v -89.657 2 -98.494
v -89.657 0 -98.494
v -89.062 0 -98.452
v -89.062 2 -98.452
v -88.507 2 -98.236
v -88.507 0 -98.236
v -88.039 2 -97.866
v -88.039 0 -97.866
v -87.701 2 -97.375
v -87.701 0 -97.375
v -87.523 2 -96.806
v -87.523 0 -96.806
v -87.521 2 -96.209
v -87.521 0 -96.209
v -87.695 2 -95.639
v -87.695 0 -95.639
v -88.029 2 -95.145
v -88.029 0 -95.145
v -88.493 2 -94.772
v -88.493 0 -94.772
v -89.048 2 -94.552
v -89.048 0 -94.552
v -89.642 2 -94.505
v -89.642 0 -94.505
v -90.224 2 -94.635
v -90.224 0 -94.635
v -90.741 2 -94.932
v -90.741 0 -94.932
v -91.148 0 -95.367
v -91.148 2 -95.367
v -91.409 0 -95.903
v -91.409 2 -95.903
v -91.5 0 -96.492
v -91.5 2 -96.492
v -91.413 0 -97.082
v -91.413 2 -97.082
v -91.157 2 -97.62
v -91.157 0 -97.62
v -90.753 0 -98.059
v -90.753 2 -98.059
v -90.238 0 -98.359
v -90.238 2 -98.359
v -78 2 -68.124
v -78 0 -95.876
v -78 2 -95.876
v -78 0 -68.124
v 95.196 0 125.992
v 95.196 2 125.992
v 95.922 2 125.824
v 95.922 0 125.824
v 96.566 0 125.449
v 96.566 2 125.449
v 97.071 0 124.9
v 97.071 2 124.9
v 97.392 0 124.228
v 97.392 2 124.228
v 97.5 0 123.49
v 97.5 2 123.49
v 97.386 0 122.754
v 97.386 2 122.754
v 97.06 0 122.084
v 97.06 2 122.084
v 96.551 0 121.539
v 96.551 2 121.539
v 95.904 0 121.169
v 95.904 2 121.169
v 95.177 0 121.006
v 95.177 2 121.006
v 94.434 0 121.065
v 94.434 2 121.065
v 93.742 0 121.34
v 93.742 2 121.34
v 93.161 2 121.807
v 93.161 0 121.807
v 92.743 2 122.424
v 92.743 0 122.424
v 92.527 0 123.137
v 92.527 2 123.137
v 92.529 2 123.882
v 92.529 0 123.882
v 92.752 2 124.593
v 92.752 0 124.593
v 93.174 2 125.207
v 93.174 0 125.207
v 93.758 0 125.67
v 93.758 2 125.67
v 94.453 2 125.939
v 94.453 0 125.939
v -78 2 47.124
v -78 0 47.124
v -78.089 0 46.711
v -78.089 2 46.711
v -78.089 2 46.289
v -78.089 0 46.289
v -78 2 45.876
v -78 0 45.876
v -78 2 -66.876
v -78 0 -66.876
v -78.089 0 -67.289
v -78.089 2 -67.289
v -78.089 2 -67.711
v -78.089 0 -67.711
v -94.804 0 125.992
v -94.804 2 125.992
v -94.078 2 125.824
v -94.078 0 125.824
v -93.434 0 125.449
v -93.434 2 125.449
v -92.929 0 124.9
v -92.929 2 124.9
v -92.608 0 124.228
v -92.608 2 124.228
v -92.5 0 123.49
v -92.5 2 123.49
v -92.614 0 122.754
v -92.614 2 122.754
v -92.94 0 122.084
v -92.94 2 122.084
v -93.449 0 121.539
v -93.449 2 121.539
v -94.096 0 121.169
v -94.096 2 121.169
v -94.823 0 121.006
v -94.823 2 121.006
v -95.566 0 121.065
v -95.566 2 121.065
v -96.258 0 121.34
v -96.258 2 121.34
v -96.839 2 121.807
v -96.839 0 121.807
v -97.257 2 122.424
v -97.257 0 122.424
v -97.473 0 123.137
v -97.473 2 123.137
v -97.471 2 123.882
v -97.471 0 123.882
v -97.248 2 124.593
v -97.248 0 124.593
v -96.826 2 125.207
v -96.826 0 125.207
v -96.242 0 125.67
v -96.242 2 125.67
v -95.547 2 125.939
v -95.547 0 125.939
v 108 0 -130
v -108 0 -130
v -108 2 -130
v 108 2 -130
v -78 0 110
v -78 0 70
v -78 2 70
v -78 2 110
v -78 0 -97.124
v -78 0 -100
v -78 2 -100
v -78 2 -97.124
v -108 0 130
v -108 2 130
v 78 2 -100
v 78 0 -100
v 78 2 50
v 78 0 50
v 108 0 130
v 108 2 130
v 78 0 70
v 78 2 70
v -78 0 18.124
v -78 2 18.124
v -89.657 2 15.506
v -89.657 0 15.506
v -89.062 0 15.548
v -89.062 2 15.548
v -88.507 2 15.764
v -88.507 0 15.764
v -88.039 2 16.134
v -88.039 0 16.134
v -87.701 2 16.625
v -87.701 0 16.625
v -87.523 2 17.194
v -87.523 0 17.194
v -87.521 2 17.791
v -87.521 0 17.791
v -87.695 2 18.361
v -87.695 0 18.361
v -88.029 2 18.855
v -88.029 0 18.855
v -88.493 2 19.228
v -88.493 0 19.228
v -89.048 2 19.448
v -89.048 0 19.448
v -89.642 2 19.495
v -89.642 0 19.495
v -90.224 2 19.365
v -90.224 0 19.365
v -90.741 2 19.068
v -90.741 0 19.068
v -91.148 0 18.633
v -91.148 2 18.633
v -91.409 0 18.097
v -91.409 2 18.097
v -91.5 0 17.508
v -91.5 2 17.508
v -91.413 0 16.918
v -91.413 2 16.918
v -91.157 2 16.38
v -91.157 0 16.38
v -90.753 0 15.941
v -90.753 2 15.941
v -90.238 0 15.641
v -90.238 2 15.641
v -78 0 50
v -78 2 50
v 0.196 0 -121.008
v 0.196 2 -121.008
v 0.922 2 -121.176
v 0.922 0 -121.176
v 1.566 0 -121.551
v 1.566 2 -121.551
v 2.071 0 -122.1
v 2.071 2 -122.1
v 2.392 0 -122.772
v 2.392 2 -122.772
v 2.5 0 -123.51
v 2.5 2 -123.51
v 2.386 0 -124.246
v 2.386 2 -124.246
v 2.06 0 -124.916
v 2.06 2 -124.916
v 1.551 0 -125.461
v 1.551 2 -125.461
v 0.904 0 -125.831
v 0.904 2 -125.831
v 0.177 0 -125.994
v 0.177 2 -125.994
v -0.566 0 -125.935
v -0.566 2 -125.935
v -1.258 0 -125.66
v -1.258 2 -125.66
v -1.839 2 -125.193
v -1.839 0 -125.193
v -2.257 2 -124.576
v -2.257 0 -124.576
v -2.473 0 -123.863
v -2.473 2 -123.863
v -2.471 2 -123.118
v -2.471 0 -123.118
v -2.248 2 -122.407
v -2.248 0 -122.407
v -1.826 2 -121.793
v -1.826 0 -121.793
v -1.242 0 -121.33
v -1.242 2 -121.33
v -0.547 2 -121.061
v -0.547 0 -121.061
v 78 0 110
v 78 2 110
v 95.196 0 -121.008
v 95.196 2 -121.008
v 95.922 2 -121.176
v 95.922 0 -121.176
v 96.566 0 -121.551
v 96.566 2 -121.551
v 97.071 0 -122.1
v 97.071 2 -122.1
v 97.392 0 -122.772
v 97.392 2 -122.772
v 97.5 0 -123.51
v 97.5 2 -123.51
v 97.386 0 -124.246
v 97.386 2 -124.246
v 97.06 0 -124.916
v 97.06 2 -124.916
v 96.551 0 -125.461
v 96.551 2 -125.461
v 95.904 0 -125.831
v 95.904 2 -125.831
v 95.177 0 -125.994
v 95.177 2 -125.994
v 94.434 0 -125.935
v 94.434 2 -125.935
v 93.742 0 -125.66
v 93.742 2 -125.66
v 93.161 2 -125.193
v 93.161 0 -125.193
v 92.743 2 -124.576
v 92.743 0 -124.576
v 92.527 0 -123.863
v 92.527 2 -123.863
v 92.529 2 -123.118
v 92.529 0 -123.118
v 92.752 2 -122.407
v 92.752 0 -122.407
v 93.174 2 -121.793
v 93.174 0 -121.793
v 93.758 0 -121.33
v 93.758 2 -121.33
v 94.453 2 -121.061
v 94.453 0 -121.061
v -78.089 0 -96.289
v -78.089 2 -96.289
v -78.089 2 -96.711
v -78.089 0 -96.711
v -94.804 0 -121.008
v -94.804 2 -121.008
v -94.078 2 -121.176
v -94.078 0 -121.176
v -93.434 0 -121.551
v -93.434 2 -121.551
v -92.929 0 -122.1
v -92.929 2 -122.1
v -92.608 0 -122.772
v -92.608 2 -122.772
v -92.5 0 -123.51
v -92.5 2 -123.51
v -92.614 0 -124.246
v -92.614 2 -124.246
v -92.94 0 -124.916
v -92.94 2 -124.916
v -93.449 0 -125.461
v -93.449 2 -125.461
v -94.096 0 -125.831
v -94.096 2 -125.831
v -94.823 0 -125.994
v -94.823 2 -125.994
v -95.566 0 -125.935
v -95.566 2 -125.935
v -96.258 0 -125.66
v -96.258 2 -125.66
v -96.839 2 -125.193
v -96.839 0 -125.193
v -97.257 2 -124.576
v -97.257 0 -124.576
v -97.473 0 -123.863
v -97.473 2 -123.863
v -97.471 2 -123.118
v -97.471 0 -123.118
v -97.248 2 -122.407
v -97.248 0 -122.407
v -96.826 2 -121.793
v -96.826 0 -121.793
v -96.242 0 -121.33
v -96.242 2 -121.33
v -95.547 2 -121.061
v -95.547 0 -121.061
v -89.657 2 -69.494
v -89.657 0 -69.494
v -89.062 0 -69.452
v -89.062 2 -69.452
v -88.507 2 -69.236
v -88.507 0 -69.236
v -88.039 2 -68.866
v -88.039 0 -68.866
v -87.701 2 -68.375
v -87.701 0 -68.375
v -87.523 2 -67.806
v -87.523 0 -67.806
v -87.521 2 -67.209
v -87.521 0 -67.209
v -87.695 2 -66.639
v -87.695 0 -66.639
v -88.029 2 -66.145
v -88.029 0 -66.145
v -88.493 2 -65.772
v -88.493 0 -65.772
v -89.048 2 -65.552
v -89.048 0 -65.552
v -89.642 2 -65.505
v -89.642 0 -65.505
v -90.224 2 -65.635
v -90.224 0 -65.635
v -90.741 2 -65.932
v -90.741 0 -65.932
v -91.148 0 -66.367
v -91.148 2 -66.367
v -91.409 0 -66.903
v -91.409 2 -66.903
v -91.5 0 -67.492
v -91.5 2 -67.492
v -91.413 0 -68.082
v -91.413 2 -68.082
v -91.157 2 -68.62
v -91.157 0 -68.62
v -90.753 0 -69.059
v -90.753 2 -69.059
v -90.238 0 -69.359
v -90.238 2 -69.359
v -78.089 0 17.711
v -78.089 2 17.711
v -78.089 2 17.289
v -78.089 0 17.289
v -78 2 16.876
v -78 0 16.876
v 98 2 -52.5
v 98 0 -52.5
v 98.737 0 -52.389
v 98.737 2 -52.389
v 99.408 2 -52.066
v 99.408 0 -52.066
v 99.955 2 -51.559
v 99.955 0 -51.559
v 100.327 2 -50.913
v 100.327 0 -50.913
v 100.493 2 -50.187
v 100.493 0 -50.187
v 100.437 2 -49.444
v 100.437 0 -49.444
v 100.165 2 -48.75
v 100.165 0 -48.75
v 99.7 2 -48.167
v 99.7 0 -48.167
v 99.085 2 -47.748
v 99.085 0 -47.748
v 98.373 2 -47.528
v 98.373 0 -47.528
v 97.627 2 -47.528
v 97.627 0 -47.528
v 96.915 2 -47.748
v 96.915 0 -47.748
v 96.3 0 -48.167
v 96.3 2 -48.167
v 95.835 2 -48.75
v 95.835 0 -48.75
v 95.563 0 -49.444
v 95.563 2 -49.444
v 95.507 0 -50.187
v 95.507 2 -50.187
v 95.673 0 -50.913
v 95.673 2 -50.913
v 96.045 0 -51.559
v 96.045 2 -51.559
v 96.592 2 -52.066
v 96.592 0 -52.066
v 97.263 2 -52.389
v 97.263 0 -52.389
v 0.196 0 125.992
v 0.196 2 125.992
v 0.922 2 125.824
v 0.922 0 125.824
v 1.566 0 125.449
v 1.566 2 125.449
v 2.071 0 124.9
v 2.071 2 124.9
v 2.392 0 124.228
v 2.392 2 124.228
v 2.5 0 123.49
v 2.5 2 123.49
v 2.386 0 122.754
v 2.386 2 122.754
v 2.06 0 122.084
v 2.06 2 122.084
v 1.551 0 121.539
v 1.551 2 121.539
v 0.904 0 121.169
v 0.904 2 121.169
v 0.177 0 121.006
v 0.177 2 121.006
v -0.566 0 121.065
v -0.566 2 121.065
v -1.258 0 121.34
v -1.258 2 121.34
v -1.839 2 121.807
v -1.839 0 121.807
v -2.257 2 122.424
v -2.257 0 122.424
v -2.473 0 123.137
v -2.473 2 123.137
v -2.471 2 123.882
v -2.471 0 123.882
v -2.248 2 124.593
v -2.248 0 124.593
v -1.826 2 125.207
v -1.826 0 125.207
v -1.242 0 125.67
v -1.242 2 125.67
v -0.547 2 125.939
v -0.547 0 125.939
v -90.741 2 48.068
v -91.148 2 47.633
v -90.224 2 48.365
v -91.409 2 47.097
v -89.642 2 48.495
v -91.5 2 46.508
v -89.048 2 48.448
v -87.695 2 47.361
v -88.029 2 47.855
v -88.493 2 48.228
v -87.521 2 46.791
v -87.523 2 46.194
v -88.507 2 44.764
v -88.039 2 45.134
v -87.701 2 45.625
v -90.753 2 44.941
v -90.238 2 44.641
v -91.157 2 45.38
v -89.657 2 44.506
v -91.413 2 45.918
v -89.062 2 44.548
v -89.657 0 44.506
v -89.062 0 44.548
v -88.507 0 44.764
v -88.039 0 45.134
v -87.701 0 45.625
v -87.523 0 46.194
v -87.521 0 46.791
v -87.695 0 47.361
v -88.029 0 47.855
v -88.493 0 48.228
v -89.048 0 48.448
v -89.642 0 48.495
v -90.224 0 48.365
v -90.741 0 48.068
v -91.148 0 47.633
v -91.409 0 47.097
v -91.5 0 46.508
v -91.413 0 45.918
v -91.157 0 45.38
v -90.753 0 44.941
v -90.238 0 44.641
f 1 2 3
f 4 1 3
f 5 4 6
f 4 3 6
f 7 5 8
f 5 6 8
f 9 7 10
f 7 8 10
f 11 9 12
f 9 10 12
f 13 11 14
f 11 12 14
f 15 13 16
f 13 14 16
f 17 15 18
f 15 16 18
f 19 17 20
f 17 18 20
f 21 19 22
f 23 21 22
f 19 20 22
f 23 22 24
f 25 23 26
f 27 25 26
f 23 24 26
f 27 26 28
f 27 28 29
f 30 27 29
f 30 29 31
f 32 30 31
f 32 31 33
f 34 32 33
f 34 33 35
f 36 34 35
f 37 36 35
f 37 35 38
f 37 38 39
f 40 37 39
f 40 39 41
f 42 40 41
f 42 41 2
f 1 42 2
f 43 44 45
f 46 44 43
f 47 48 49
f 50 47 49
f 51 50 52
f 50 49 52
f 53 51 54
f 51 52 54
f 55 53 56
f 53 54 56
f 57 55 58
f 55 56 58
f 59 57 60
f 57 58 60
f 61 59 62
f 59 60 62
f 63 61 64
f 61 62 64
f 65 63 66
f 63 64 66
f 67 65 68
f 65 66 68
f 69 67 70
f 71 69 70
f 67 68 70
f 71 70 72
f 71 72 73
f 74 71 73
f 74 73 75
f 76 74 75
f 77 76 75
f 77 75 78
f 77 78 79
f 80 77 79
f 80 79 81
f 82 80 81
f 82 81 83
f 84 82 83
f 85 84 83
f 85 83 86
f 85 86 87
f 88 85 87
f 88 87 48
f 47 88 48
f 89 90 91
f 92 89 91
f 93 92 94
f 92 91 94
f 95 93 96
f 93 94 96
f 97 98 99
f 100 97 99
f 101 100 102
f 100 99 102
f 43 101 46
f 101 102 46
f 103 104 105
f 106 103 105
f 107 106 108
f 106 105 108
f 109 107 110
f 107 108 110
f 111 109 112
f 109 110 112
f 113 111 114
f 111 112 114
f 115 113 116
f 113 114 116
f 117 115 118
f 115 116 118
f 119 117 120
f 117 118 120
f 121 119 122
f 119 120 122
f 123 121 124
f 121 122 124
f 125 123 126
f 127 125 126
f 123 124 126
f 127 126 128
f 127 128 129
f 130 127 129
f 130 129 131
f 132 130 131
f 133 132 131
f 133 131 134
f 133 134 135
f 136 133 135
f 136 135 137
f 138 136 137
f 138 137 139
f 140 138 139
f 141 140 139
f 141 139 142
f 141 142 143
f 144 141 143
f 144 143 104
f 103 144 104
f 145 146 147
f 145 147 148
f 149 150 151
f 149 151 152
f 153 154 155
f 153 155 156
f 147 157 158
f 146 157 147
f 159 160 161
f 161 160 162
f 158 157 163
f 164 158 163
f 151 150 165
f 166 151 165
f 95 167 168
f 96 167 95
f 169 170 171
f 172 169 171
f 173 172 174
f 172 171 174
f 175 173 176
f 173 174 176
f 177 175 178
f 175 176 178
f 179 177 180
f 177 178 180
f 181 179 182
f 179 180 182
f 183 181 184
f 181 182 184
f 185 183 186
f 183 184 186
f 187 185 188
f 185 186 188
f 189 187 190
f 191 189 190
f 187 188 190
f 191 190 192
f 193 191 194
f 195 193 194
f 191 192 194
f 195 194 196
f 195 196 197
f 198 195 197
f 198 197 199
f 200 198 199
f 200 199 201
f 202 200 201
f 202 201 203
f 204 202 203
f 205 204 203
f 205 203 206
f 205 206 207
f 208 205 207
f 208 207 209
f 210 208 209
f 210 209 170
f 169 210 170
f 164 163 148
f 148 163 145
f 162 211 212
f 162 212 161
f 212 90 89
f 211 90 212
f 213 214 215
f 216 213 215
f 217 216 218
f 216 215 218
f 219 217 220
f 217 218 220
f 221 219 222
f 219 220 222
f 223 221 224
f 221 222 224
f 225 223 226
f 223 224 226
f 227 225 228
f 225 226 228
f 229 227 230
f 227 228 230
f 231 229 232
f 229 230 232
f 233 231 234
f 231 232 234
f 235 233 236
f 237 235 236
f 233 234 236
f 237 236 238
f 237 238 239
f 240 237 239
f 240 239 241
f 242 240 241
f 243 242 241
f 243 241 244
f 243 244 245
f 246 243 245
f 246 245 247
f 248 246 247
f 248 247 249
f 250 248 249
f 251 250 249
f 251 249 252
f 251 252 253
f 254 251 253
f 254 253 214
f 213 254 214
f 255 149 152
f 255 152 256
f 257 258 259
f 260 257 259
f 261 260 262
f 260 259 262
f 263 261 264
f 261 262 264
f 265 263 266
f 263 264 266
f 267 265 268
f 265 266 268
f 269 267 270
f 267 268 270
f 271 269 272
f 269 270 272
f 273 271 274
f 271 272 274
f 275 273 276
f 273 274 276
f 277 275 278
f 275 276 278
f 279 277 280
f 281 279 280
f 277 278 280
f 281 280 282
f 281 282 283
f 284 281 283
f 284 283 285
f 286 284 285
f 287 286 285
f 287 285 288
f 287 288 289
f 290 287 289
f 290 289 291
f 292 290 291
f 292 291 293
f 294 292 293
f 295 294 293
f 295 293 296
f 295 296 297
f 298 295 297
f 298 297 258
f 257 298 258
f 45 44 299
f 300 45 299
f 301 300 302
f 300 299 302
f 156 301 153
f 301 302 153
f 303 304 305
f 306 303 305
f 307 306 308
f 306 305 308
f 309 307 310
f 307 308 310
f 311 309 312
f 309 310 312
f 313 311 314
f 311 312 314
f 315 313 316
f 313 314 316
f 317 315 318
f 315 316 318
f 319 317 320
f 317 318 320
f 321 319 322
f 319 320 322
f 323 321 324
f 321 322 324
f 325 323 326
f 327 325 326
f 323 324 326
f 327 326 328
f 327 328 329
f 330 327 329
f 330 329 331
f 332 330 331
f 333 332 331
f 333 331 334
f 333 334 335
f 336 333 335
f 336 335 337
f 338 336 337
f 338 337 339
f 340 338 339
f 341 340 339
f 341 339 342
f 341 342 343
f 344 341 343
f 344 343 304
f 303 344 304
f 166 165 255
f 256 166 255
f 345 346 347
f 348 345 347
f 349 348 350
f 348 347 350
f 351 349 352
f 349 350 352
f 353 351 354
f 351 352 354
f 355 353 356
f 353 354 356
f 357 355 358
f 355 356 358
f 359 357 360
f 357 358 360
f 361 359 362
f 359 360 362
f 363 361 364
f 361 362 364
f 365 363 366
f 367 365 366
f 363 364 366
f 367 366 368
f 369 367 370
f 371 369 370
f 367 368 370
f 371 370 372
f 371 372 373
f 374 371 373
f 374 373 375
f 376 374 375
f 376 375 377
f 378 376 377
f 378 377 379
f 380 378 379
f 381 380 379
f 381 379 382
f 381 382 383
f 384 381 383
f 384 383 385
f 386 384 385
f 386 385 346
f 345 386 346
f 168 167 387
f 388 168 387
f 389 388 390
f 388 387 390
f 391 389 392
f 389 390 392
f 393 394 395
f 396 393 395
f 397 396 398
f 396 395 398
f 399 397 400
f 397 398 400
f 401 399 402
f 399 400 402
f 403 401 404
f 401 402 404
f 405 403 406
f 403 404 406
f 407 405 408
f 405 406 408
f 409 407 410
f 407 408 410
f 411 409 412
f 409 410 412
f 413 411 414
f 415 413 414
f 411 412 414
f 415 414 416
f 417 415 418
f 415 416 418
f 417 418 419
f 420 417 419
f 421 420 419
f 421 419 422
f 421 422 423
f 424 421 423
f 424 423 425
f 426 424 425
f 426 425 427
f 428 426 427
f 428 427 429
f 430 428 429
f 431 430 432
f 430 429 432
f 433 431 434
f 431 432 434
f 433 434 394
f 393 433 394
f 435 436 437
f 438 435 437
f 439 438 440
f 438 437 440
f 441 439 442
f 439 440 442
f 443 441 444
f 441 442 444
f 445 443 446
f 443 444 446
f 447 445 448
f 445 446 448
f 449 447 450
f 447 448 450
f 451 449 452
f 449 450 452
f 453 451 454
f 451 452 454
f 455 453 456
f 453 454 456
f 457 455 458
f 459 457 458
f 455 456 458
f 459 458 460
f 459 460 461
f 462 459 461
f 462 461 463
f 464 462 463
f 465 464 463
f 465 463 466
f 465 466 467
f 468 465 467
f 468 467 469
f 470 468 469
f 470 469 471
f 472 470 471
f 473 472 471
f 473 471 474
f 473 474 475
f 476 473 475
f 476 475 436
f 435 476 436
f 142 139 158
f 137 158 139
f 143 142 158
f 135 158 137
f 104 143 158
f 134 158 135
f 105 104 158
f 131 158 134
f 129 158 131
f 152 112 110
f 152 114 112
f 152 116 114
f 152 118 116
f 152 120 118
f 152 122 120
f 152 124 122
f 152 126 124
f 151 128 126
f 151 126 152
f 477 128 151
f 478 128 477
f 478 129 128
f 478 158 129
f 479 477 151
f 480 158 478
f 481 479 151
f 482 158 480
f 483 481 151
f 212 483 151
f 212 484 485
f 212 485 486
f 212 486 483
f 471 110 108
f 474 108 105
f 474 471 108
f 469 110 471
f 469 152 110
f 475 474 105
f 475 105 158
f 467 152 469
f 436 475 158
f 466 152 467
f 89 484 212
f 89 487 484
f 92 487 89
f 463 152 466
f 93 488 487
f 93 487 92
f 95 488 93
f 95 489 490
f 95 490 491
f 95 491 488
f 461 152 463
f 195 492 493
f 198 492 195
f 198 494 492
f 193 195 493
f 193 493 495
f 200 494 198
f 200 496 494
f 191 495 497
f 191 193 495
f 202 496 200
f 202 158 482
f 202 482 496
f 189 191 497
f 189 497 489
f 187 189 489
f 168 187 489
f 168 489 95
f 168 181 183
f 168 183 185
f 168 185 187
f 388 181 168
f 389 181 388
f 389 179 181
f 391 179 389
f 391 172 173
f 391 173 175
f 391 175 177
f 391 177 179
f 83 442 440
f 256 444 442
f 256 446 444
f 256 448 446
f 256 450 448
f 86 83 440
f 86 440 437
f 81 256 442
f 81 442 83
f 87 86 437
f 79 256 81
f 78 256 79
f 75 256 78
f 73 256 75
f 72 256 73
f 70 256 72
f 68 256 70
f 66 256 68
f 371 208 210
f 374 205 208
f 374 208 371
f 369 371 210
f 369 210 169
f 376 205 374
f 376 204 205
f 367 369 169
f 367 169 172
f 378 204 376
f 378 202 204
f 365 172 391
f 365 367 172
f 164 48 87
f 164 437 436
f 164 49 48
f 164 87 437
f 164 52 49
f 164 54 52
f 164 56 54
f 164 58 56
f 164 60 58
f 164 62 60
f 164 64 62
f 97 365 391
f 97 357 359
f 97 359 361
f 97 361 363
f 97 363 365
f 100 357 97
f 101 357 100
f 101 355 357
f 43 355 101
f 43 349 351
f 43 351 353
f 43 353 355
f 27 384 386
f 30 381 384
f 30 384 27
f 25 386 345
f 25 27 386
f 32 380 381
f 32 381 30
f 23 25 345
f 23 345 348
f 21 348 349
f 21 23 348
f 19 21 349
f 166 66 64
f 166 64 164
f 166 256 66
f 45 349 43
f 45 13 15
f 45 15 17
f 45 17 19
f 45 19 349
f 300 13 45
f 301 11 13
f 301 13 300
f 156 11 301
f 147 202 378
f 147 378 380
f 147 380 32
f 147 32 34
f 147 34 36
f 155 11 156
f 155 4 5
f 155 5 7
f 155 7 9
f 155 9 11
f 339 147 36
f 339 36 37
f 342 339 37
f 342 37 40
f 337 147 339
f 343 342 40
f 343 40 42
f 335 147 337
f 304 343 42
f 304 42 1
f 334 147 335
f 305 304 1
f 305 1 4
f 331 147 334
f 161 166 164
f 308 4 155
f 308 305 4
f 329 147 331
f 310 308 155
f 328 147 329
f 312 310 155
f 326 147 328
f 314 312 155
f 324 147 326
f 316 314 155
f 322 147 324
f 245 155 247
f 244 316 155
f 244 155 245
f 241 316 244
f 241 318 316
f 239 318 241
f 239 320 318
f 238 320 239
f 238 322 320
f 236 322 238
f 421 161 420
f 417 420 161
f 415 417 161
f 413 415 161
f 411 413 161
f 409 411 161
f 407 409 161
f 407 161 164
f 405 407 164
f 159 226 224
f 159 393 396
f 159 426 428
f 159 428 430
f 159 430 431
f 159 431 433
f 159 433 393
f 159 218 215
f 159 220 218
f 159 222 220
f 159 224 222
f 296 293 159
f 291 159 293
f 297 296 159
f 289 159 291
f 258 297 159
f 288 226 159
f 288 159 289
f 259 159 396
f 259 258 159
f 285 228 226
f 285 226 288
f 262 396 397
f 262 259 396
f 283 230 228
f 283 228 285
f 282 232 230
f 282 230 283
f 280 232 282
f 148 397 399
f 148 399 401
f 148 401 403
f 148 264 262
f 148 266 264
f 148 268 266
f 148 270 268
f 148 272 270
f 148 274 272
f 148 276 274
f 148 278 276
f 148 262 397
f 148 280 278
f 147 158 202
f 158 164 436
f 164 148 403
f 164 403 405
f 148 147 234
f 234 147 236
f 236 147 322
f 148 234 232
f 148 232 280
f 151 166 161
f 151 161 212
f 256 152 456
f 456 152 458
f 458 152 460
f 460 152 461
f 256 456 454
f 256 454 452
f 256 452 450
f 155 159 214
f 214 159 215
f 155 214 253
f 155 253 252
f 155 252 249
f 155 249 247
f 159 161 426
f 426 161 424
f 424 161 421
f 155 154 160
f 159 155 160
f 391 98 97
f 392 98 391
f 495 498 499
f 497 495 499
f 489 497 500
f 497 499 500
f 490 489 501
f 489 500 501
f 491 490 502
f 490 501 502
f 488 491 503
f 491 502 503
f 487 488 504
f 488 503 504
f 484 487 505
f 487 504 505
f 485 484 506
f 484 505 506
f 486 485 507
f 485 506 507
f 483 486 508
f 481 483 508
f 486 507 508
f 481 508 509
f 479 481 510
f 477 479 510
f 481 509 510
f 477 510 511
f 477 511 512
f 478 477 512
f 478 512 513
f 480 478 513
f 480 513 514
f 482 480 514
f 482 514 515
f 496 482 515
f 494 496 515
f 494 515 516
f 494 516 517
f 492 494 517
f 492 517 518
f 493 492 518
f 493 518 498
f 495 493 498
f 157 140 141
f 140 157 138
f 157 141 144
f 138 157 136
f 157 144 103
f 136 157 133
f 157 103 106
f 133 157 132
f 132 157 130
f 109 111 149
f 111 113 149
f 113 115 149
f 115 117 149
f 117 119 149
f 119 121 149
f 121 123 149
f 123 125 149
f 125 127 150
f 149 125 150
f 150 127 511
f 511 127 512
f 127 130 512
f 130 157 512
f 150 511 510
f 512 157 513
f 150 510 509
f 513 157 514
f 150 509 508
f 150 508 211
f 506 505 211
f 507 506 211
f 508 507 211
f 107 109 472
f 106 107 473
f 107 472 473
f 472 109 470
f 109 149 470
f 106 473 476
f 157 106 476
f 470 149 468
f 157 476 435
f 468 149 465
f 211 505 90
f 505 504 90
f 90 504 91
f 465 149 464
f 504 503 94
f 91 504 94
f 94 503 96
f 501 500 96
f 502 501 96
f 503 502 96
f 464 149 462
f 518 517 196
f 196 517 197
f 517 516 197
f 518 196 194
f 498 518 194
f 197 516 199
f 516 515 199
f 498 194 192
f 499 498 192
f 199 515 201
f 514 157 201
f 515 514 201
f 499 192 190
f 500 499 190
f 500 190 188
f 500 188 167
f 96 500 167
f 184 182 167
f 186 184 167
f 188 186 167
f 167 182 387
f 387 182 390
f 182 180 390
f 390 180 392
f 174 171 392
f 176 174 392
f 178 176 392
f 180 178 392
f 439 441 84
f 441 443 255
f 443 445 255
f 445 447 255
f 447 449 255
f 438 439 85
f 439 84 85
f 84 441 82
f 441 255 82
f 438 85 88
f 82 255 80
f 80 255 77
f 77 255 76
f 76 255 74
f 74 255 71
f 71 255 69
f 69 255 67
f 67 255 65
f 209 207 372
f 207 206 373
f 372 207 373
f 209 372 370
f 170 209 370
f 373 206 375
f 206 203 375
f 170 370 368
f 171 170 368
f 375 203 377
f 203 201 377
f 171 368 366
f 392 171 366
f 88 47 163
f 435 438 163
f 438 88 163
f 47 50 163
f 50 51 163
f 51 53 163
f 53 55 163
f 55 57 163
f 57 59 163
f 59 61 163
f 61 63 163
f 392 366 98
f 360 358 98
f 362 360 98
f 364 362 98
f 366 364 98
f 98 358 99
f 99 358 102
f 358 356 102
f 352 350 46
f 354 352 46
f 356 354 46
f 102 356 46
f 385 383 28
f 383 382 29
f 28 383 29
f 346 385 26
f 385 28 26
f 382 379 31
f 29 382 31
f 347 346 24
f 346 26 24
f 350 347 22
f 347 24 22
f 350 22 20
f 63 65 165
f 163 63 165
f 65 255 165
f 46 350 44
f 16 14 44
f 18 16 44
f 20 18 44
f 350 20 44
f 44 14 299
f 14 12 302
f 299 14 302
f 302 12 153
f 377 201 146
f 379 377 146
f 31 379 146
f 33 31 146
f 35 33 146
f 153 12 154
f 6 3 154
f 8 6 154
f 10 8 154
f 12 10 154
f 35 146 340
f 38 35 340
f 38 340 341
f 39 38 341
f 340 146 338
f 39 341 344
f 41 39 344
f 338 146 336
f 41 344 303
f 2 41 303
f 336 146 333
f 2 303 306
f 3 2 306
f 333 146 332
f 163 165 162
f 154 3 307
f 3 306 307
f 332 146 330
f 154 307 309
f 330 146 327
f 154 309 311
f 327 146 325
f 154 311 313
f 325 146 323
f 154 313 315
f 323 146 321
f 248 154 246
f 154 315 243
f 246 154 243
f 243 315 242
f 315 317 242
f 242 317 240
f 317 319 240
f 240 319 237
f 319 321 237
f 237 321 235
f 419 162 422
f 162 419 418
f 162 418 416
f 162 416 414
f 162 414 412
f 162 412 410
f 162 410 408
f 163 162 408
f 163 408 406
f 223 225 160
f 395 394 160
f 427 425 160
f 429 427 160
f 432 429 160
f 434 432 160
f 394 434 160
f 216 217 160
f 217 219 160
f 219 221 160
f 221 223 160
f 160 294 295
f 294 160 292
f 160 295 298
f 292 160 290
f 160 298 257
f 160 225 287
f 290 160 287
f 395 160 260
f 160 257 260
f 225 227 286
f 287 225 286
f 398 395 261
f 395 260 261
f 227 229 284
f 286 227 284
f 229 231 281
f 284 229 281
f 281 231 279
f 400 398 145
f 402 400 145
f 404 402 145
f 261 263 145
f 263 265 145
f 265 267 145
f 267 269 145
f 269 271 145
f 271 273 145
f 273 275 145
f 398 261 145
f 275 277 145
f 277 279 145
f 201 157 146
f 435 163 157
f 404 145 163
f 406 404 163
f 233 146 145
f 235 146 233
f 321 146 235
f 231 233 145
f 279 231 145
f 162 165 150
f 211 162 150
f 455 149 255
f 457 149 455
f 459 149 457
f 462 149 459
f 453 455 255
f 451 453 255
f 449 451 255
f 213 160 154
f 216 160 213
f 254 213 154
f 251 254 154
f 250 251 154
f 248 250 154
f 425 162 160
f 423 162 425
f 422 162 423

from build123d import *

# Parameters (mm, degrees)
SKETCH_1_W          = 216
SKETCH_1_H          = 260
EXTRUDE_1_DEPTH     = 2
SKETCH_3_W          = 156
SKETCH_3_H          = 150
SKETCH_3_H_2        = 40
CUT_EXTRUDE_2_DEPTH = 2
SKETCH_5_R          = 2.5
CUT_EXTRUDE_3_DEPTH = 2
MM_2_D              = 4
MM_2_DEPTH          = 10
MM_2_TIP            = 1.201721238
MM_4_D              = 5
MM_4_DEPTH          = 380


with BuildPart() as part:
    # 草图1 → 凸台-拉伸1 (new body)
    with BuildSketch(Plane(origin=(0, 0, 0), x_dir=(1, 0, 0), z_dir=(0, 1, 0))):
        Rectangle(SKETCH_1_W, SKETCH_1_H)
    extrude(amount=EXTRUDE_1_DEPTH)

    # 草图3 → 切除-拉伸2 (cut)
    with BuildSketch(Plane.XZ):
        with Locations((0, -25)):
            Rectangle(SKETCH_3_W, SKETCH_3_H)
        with Locations((0, 90)):
            Rectangle(SKETCH_3_W, SKETCH_3_H_2)
    extrude(amount=-CUT_EXTRUDE_2_DEPTH, mode=Mode.SUBTRACT)

    # 草图5 → 切除-拉伸3 (cut)
    with BuildSketch(Plane.XZ):
        with Locations(Location((98, -50, 0), (0, 0, 270))):
            Circle(SKETCH_5_R)
    extrude(amount=-CUT_EXTRUDE_3_DEPTH, mode=Mode.SUBTRACT)

    # 大小mm 暗销孔2
    with Locations(Plane(origin=(45.636831669, 3.8, 442.05931397), x_dir=(0.07852837759024343, 0, 0.9969118787099711), z_dir=(0, 1, 0))):
        with Locations((-404.949854974, -103.656881575), (-403.897574678, -90.298262111), (-432.80801916, -88.020939161), (-433.860299457, -101.379558625), (-547.50825363, -92.42732358), (-518.597809147, -94.70464653), (-517.545528888, -81.346027355), (-546.45597337, -79.068704405)):
            Hole(MM_2_D / 2, depth=MM_2_DEPTH)
            with Locations((0, 0, -(MM_2_DEPTH + MM_2_TIP / 2))):  # 118° drill point
                Cone(0, MM_2_D / 2, MM_2_TIP, mode=Mode.SUBTRACT)

    # 大小mm 暗销孔4
    with Locations(Plane(origin=(45.636831669, -378, 442.05931397), x_dir=(-0.07852837759024327, 0, -0.9969118787099712), z_dir=(0, -1, 0))):
        with Locations((559.93638869, 93.623184237), (567.396584561, -1.08344424), (574.856780432, -95.790072718), (313.699154648, 74.226674972), (321.159350519, -20.479953505), (328.61954639, -115.186581983)):
            Hole(MM_4_D / 2, depth=MM_4_DEPTH)


solid = part.part
